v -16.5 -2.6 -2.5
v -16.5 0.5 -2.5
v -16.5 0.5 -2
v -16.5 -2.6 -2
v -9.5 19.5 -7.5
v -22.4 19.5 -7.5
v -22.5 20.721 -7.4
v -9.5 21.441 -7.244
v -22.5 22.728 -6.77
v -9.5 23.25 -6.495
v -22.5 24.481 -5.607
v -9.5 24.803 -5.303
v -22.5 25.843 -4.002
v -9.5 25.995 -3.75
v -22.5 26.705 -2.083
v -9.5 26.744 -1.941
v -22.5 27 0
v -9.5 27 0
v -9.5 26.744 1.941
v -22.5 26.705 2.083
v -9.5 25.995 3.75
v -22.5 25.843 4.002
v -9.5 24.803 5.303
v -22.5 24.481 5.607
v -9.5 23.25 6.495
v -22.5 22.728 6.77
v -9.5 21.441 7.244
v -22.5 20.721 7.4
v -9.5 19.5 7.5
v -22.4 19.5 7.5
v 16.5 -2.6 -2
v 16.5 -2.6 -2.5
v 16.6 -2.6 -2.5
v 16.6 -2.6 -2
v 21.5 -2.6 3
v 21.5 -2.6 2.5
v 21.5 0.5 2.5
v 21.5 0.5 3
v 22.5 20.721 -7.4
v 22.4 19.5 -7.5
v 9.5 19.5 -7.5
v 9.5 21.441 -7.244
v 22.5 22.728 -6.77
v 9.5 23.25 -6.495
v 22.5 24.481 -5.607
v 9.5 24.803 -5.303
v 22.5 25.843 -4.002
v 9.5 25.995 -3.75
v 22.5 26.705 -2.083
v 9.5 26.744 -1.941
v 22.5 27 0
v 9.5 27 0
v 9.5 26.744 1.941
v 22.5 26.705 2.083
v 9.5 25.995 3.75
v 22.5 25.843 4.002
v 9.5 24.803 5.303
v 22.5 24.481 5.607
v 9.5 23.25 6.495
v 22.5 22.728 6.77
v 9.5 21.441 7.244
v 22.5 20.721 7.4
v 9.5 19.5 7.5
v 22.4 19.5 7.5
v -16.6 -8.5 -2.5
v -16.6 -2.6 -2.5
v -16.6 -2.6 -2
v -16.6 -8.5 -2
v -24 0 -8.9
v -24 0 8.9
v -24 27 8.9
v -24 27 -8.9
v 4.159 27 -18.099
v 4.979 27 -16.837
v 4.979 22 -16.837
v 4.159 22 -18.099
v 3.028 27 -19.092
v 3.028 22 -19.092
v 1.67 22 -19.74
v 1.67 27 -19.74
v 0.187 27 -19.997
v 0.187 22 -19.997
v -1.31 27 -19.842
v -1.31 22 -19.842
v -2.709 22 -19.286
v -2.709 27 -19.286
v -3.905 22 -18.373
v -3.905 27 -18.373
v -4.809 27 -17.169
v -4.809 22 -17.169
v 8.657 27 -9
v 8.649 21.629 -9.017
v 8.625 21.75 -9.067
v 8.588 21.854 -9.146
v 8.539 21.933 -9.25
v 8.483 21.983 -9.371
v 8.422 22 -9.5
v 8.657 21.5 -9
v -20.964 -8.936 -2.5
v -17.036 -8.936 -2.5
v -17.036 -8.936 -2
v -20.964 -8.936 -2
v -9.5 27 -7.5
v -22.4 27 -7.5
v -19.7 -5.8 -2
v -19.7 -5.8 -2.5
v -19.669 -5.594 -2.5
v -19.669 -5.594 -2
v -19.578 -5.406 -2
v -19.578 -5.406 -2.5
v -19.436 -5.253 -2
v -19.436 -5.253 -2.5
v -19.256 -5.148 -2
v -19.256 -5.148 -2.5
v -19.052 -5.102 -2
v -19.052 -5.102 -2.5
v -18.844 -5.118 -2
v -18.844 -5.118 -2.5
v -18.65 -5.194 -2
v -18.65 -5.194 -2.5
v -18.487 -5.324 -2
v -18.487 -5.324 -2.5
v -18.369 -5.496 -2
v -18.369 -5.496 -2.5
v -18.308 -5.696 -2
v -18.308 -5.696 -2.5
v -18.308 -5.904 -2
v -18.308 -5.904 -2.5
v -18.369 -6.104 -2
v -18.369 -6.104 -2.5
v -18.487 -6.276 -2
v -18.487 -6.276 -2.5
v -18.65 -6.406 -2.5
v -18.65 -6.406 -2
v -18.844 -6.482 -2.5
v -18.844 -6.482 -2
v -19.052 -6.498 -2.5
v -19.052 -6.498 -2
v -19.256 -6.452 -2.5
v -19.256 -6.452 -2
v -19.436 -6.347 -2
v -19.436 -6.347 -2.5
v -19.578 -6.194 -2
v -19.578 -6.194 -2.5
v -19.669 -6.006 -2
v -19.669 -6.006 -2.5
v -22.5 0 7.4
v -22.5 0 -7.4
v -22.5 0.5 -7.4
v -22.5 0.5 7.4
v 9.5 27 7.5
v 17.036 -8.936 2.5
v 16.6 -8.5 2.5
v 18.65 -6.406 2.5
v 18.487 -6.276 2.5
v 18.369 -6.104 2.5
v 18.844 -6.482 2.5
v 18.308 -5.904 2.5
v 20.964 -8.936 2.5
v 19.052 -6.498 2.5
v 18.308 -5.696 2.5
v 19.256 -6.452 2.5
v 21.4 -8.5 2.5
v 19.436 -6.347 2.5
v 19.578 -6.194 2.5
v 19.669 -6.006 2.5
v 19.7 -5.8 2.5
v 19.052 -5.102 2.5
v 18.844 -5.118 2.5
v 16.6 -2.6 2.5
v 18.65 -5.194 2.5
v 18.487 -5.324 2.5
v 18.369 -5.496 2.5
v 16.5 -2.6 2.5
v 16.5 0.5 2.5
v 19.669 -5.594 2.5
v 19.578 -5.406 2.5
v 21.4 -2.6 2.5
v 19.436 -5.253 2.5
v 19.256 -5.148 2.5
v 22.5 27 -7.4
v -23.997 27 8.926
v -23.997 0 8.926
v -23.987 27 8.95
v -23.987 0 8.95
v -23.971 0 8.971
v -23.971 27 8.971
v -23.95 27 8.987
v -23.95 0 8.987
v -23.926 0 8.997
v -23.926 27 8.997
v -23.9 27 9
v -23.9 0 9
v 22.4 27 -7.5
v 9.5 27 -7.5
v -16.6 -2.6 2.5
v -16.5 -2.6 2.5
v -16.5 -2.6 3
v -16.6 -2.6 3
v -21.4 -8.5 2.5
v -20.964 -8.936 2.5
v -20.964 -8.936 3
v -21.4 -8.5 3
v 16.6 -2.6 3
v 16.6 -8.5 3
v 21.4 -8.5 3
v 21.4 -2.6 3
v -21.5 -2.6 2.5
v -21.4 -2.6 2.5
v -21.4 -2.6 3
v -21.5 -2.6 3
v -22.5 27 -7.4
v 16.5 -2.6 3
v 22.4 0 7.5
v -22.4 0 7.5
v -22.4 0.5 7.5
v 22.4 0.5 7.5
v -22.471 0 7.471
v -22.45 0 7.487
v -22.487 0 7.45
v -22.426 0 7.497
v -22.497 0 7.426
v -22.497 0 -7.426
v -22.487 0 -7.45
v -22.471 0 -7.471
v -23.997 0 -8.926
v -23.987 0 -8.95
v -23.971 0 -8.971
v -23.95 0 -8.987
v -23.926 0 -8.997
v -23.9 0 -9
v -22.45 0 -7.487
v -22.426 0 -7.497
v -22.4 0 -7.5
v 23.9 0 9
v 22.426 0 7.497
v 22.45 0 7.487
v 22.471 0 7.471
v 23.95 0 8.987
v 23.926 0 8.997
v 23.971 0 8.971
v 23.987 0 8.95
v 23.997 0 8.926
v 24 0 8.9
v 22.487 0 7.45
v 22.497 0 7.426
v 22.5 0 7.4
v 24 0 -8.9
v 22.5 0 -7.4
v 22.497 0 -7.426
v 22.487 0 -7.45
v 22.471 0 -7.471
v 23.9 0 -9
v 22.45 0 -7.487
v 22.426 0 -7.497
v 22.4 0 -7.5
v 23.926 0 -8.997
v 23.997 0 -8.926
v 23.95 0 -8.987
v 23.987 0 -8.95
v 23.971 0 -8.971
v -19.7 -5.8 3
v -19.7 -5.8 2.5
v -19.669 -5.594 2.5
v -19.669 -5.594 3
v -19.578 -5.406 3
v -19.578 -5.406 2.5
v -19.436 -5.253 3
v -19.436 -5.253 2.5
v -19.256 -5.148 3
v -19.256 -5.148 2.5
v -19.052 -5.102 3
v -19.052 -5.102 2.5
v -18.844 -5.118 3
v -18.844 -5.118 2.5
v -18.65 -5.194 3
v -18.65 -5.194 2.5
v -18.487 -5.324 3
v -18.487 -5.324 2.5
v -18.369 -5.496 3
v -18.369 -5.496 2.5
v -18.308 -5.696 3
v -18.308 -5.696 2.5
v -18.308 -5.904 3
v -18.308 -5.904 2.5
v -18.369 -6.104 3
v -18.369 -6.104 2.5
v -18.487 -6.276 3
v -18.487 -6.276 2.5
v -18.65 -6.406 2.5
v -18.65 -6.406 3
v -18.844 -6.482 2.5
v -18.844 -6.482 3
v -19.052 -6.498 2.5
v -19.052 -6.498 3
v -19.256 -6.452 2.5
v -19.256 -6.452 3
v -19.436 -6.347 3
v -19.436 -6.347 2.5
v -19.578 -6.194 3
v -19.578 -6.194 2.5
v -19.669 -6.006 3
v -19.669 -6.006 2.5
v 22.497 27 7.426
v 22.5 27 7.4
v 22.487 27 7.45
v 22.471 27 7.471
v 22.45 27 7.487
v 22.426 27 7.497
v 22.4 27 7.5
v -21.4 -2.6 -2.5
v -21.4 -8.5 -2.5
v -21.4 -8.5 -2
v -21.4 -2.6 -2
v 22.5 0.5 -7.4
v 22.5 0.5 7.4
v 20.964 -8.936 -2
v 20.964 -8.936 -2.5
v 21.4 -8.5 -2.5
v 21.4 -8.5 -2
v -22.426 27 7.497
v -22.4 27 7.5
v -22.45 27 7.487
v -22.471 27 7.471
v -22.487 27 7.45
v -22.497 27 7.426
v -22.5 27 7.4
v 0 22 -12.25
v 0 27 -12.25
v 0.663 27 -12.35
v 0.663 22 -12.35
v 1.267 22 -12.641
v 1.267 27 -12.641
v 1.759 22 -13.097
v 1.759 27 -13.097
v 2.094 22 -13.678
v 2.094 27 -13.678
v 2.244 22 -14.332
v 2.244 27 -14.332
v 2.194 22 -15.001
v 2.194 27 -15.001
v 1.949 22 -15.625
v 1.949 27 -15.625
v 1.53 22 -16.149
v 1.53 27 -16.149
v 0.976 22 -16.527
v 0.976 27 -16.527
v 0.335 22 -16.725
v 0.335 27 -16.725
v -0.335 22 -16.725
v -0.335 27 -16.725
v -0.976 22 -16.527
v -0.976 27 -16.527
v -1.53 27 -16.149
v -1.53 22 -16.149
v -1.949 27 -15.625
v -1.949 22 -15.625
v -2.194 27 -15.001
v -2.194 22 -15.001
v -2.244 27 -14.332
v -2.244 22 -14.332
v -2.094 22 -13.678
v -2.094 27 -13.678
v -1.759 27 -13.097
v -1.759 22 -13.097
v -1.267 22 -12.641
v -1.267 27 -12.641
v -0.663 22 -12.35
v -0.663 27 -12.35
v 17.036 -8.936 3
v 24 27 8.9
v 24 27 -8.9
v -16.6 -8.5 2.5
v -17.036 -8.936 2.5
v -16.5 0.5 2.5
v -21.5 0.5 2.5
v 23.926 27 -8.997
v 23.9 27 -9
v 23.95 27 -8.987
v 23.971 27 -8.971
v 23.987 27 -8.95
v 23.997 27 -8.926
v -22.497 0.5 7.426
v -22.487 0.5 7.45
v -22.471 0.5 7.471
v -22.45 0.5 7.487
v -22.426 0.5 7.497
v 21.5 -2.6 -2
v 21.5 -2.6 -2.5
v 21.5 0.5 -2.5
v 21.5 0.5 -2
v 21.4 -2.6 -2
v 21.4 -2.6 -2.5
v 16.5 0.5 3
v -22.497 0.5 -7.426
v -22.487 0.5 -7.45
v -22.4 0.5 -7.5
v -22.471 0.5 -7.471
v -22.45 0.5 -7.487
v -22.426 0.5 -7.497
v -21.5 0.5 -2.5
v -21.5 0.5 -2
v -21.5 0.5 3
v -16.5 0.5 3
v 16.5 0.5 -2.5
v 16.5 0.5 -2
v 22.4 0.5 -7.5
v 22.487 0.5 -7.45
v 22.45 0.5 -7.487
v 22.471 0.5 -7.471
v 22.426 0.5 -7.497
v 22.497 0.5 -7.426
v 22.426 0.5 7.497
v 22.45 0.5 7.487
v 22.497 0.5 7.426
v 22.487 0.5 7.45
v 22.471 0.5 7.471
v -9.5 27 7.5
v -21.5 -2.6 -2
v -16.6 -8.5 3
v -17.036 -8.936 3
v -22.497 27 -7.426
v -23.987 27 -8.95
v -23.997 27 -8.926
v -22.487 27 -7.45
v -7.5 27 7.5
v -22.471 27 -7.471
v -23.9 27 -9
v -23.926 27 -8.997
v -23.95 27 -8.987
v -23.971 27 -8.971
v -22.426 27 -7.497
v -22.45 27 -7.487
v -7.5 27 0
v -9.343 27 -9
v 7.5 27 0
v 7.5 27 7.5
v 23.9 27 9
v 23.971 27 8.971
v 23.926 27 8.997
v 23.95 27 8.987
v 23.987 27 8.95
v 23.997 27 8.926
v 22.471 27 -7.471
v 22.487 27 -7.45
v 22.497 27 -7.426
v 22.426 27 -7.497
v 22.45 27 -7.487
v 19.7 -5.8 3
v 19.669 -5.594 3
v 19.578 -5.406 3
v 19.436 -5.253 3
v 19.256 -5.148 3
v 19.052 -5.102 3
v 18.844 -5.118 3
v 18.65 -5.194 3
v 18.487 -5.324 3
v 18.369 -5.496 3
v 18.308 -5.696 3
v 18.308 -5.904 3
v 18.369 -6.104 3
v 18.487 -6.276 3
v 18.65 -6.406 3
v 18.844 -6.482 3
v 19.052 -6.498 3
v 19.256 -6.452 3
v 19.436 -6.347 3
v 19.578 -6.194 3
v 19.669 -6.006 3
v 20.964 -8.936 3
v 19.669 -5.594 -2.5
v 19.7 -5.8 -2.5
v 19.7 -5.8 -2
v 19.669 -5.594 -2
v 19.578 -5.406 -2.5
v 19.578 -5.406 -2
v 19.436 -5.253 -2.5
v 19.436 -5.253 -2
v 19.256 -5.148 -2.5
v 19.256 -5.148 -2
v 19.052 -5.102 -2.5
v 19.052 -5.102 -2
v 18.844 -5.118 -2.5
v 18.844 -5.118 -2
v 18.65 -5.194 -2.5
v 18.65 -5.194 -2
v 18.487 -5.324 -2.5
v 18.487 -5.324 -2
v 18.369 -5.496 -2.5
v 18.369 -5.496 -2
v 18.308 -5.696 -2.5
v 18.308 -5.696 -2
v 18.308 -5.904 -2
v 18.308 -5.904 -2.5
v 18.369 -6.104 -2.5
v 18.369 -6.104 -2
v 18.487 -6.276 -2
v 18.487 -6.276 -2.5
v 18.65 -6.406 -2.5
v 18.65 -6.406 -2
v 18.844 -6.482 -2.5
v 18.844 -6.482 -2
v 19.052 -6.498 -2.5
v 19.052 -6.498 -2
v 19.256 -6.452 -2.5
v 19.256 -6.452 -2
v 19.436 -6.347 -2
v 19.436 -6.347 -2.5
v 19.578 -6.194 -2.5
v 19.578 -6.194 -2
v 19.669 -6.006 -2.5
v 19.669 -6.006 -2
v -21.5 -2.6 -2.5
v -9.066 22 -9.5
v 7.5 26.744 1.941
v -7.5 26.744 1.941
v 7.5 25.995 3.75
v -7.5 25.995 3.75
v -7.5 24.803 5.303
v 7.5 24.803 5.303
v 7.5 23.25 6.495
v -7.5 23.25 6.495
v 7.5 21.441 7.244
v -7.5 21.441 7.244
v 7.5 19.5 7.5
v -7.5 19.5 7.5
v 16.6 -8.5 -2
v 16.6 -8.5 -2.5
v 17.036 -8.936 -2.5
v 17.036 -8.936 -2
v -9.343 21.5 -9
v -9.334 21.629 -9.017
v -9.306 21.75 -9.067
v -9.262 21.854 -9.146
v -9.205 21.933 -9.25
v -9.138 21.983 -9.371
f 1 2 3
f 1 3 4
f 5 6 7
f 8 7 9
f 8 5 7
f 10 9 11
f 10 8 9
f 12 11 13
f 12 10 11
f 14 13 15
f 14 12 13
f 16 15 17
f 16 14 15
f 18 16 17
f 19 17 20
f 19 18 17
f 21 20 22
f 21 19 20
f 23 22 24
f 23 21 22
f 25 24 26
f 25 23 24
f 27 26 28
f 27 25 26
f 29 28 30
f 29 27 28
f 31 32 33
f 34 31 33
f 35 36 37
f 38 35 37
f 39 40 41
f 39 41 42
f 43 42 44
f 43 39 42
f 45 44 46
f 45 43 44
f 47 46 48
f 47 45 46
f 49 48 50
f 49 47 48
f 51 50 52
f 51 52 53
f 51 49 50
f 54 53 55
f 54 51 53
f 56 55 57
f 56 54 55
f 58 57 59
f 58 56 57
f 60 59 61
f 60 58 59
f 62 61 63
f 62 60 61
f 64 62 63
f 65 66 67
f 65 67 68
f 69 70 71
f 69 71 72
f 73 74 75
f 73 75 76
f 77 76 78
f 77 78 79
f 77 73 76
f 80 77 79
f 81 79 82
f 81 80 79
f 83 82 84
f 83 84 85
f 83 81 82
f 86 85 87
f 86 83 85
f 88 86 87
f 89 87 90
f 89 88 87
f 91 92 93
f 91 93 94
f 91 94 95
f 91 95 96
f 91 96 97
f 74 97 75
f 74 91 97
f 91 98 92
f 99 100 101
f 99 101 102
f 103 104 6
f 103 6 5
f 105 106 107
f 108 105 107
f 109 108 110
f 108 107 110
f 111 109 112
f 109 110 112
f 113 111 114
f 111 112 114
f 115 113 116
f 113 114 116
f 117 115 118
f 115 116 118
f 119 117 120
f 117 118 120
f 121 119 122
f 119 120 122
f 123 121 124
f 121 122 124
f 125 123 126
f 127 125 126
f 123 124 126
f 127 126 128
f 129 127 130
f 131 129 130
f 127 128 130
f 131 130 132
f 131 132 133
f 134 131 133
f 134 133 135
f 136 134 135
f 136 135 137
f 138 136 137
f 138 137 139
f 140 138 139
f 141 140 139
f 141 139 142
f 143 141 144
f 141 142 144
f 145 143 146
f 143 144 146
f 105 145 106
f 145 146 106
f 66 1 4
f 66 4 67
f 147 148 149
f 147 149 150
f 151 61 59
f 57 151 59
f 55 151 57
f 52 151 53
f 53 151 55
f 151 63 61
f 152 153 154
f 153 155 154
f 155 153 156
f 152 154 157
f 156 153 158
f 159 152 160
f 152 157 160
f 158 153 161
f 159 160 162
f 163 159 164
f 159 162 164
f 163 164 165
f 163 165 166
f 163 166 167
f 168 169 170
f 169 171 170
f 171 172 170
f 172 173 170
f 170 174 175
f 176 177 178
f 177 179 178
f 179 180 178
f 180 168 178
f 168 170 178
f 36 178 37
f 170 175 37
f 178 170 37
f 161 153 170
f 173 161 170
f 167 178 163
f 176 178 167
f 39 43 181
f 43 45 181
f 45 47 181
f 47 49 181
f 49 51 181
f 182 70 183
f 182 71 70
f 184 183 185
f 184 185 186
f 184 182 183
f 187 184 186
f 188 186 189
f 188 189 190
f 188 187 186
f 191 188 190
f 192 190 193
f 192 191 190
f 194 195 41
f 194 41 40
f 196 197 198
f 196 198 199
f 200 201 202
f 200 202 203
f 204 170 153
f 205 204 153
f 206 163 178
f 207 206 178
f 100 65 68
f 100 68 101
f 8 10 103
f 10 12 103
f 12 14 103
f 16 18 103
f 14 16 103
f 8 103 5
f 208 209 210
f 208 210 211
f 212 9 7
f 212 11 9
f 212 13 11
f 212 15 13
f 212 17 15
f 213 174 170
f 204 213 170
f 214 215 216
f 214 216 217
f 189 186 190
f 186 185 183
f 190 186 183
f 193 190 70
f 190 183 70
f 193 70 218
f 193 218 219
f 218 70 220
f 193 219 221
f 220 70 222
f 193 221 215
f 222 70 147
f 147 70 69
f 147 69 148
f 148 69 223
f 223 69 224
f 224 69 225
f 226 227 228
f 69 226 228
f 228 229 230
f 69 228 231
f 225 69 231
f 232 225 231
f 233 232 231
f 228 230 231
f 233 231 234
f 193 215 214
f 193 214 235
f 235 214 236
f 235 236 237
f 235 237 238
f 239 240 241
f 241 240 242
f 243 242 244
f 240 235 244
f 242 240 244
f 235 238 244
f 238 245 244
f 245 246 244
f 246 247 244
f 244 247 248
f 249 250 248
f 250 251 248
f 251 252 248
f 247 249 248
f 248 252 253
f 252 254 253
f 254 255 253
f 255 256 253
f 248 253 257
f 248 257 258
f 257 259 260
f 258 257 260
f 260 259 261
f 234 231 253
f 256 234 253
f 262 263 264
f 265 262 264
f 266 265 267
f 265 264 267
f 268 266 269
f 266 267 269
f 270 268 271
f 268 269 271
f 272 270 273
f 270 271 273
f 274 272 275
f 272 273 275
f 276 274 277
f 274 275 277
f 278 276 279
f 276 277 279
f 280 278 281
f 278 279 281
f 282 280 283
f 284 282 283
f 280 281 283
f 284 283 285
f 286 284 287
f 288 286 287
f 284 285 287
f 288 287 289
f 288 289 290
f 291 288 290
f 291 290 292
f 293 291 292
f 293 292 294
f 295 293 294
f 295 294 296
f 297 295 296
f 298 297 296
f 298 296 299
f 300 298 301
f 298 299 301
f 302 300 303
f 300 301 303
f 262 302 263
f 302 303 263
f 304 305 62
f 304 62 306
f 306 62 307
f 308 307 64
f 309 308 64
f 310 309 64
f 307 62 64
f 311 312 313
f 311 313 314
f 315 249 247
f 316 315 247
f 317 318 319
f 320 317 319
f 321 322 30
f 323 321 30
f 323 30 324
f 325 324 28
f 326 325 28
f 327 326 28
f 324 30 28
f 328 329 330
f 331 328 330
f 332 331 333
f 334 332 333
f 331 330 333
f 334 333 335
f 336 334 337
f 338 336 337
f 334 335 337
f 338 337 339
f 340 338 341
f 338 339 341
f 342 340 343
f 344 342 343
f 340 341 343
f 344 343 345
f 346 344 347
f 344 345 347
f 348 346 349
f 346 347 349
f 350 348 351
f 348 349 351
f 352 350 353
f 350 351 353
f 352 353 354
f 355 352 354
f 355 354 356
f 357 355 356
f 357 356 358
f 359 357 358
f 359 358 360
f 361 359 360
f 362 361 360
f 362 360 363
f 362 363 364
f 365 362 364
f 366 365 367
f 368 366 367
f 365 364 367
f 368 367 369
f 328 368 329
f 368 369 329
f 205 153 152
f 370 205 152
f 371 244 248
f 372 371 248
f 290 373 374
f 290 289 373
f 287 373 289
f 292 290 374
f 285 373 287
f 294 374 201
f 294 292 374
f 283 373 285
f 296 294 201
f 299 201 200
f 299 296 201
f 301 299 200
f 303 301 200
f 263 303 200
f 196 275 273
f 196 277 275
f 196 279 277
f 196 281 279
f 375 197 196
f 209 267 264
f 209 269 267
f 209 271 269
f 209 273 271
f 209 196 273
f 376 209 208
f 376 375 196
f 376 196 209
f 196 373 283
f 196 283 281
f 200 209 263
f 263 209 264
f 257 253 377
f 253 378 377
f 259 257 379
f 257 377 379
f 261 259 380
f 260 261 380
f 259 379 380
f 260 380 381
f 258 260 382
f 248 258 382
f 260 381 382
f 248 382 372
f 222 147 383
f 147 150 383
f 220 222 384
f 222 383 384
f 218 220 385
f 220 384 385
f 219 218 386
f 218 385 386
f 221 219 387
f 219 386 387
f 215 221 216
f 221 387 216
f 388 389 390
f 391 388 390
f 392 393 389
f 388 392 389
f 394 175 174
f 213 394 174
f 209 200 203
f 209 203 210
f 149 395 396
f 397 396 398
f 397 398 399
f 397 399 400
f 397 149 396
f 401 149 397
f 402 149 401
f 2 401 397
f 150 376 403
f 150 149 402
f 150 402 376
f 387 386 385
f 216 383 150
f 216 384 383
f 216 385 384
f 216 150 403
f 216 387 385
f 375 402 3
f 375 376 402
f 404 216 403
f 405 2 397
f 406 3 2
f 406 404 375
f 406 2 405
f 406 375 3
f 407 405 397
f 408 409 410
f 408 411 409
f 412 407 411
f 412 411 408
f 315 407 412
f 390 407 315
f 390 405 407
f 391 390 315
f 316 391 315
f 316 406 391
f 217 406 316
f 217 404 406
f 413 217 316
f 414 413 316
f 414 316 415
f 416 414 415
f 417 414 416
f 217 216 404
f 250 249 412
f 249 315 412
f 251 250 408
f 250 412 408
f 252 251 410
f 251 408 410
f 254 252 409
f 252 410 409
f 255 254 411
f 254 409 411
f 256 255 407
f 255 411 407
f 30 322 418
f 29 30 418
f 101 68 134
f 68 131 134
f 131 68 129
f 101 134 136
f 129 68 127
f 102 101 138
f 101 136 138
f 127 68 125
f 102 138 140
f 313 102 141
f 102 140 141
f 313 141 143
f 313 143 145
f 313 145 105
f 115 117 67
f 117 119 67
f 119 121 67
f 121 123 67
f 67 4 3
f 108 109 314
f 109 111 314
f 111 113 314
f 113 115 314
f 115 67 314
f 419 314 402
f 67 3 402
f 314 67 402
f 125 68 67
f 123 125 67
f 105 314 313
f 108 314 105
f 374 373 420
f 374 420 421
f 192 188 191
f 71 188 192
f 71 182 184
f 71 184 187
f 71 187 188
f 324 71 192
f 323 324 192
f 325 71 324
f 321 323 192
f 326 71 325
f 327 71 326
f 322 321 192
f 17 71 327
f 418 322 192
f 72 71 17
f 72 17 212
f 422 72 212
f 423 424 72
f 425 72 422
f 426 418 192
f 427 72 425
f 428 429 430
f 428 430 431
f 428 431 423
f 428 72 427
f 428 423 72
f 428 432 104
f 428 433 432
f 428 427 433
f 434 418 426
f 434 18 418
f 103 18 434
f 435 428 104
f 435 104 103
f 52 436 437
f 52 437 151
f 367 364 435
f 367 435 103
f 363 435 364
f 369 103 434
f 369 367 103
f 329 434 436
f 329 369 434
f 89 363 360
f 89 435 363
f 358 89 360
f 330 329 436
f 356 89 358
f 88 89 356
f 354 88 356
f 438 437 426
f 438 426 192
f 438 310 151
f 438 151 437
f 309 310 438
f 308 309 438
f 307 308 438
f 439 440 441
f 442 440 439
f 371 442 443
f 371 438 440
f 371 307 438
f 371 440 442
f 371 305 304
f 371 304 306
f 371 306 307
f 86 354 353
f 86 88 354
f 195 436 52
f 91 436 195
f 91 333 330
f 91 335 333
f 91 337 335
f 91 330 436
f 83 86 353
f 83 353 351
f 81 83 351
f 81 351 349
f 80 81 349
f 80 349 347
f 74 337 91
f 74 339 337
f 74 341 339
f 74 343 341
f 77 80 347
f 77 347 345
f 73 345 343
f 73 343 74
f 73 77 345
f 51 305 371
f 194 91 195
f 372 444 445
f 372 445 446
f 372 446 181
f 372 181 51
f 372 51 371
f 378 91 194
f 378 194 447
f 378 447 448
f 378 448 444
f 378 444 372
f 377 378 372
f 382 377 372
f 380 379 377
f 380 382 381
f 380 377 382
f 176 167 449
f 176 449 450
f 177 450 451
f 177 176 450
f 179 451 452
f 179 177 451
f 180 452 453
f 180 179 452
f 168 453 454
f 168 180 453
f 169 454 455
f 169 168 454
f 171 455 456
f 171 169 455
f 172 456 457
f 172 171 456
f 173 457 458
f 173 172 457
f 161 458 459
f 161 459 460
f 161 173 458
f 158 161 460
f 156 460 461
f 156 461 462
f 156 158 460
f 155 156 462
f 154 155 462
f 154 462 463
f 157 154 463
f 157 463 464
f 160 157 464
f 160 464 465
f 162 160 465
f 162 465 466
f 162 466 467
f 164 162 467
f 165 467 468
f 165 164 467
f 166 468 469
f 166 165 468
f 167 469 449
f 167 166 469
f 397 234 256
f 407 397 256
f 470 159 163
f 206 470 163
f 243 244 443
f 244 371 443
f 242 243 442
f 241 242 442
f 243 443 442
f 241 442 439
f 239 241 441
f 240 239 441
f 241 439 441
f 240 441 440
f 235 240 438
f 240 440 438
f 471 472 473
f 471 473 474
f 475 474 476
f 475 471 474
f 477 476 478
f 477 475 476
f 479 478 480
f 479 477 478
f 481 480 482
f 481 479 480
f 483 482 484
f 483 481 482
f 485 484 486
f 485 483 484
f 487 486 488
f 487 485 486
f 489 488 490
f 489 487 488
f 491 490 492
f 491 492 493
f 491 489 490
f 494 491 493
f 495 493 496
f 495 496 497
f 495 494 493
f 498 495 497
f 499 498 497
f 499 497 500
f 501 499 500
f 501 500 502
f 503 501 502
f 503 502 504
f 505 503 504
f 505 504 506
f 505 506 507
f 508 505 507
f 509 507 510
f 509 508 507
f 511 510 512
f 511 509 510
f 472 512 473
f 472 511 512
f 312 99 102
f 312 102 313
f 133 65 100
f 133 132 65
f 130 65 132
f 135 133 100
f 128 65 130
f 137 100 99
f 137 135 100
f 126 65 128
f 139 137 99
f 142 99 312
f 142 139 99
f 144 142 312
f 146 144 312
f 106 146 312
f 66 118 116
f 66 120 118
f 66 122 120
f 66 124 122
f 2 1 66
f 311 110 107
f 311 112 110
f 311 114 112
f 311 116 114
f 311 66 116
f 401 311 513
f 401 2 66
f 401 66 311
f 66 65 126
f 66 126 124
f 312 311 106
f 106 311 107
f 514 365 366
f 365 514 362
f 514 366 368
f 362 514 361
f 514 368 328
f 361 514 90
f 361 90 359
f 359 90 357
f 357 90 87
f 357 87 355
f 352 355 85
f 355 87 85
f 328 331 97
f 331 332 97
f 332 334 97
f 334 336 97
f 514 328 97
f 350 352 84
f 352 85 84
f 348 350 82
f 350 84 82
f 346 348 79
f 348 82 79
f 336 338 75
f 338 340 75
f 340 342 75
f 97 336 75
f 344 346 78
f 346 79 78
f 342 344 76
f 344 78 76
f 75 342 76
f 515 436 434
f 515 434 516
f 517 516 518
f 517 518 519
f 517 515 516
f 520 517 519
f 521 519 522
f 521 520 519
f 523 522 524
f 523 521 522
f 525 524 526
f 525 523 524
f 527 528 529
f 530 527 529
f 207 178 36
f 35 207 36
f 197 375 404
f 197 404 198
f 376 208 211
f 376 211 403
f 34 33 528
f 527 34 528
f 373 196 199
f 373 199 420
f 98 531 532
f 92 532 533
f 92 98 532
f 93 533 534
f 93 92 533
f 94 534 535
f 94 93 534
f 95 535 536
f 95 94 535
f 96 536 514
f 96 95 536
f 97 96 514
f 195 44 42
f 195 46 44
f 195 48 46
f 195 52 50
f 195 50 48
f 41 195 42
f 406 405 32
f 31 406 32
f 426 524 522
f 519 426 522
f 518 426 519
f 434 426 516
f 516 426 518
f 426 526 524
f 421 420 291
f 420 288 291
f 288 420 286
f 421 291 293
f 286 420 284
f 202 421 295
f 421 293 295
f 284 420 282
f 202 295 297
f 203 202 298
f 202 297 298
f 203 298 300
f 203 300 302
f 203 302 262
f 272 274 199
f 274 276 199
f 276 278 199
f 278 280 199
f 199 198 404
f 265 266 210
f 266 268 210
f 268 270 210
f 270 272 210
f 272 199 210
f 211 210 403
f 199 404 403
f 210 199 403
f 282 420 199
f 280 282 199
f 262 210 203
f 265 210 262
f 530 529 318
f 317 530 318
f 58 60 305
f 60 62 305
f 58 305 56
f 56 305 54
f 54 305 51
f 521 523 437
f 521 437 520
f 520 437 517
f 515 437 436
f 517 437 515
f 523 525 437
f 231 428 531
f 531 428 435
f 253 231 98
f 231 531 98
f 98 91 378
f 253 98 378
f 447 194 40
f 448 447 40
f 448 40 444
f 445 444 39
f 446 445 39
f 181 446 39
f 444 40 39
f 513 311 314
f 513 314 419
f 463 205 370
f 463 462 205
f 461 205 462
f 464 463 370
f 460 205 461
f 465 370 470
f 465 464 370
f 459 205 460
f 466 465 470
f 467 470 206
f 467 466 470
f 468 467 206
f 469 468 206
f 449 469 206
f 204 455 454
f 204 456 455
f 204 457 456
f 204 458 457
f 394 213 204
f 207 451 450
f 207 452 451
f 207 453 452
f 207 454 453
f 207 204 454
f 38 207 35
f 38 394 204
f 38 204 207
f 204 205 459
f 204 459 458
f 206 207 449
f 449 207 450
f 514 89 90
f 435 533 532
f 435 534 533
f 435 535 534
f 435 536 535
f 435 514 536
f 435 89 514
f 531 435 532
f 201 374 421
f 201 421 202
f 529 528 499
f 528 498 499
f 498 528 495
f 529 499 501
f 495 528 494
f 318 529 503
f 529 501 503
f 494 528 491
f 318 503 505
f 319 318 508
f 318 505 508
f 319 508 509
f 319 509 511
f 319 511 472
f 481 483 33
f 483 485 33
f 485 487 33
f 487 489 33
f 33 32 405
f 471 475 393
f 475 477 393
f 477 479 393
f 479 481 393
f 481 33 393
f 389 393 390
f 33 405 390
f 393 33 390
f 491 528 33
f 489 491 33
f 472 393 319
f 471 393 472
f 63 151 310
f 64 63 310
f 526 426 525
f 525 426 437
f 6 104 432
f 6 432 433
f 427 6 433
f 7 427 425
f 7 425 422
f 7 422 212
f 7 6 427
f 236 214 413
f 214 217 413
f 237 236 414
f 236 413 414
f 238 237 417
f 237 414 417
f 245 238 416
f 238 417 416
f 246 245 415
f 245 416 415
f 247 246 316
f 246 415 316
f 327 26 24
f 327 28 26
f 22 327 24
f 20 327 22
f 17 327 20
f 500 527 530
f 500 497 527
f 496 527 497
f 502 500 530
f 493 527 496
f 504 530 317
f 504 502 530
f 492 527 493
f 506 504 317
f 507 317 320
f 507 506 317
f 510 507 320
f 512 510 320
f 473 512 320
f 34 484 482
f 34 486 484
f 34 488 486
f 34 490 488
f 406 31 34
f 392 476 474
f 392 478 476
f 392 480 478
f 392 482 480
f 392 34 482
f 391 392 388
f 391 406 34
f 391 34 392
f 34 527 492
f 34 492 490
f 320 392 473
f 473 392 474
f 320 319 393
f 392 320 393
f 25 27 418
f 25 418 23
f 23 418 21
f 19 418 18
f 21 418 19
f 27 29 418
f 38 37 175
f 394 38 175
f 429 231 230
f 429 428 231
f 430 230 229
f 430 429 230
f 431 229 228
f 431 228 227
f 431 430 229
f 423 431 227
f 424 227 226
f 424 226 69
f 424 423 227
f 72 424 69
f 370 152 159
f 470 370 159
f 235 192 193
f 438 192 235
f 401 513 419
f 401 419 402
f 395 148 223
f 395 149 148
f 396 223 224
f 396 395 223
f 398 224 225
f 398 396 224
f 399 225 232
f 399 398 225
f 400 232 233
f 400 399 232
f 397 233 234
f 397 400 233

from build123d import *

# Parameters (mm, degrees)
SKETCH1_W            = 48
SKETCH1_H            = 18
BOSS_EXTRUDE1_DEPTH  = 27
SKETCH7_W            = 45
SKETCH7_H            = 15
CUT_EXTRUDE8_DEPTH   = 38.229020938
BOSS_EXTRUDE4_REACH  = 56.518
SKETCH10_W           = 2
SKETCH10_H           = 18
BOSS_EXTRUDE5_DEPTH  = 27
SKETCH11_R           = 2.25
BOSS_EXTRUDE7_DEPTH  = 5
FILLET1_R            = 0.5
SKETCH12_W           = 45
SKETCH12_H           = 15
CUT_EXTRUDE9_DEPTH   = 0.5
BOSS_EXTRUDE8_START  = 2.5
SKETCH15_R           = 0.7
BOSS_EXTRUDE8_DEPTH  = 0.5
BOSS_EXTRUDE9_START  = -2.5
SKETCH15_2_R         = 0.7
BOSS_EXTRUDE9_DEPTH  = 0.5
FILLET2_R            = 0.1
BOSS_EXTRUDE10_REACH = 41.715
SKETCH16_W           = 15
SKETCH16_H           = 7.5
FILLET3_R            = 0.1


with BuildPart() as part:
    # Sketch1 → Boss-Extrude1 (new body)
    with BuildSketch(Plane(origin=(0, 0, 0), x_dir=(1, 0, 0), z_dir=(0, 1, 0))):
        Rectangle(SKETCH1_W, SKETCH1_H)
    extrude(amount=BOSS_EXTRUDE1_DEPTH)

    # Sketch7 → Cut-Extrude8 (cut, through all)
    with BuildSketch(Plane(origin=(0, 27, 0), x_dir=(1, 0, 0), z_dir=(0, 1, 0))):
        Rectangle(SKETCH7_W, SKETCH7_H)
    extrude(amount=-CUT_EXTRUDE8_DEPTH, mode=Mode.SUBTRACT)


with BuildPart() as body_2:

    # Sketch9 → Boss-Extrude4 (new, up to next)
    with BuildSketch(Plane.ZY.offset(-22.5), mode=Mode.PRIVATE) as boss_extrude4_sk1:
        with BuildLine():
            Line((-7.5, 0), (-7.5, 19.5))
            ThreePointArc((-7.5, 19.5), (0, 27), (7.5, 19.5))
            Line((7.5, 19.5), (7.5, 0))
            Line((7.5, 0), (-7.5, 0))
        make_face()
    boss_extrude4_tool1 = extrude(boss_extrude4_sk1.sketch, amount=BOSS_EXTRUDE4_REACH, mode=Mode.PRIVATE) - part.part
    add(boss_extrude4_tool1.solids().sort_by_distance((22.5, 12.750425, 0))[0])


with BuildPart() as part_1:
    add(part.part)

    add(body_2.part)  # Boss-Extrude5 merges body 2
    # Sketch10 → Boss-Extrude5 (add)
    with BuildSketch(Plane(origin=(0, 27, 0), x_dir=(1, 0, 0), z_dir=(0, 1, 0))):
        with Locations((-8.5, 0)):
            Rectangle(SKETCH10_W, SKETCH10_H)
        with Locations((8.5, 0)):
            Rectangle(SKETCH10_W, SKETCH10_H)
    extrude(amount=-BOSS_EXTRUDE5_DEPTH)

    # Sketch11 → Boss-Extrude7 (add)
    with BuildSketch(Plane(origin=(0, 27, 0), x_dir=(1, 0, 0), z_dir=(0, 1, 0))):
        with BuildLine():
            Line((-9.34326642, 9), (8.65673358, 9))
            Line((8.65673358, 9), (4.978963589, 16.836647508))
            ThreePointArc((4.978963589, 16.836647508), (0.186765378, 19.996828057), (-4.808879939, 17.169208446))
            Line((-4.808879939, 17.169208446), (-9.34326642, 9))
        make_face()
        with Locations(Location((0, 14.5, 0), (0, 0, 270))):
            Circle(SKETCH11_R, mode=Mode.SUBTRACT)
    extrude(amount=-BOSS_EXTRUDE7_DEPTH)

    # Fillet1
    fillet1_edges = [part_1.edges().sort_by_distance(p)[0] for p in [
        (-0.34326642, 22, -9),
    ]]
    fillet(fillet1_edges, radius=FILLET1_R)

    # Sketch12 → Cut-Extrude9 (cut)
    with BuildSketch(Plane.XZ):
        Rectangle(SKETCH12_W, SKETCH12_H)
    extrude(amount=-CUT_EXTRUDE9_DEPTH, mode=Mode.SUBTRACT)

    # Sketch15<2> → Boss-Extrude9 (add)
    with BuildSketch(Plane.XY.offset(BOSS_EXTRUDE9_START)):
        Polygon((21.5, 0.5), (16.5, 0.5), (16.5, -2.6), (16.6, -2.6), (16.6, -8.5), (17.035978299, -8.935978299), (20.964021701, -8.935978299), (21.4, -8.5), (21.4, -2.6), (21.5, -2.6), align=None)
        with Locations((19, -5.8)):
            Circle(SKETCH15_2_R, mode=Mode.SUBTRACT)
    boss_extrude9 = extrude(amount=BOSS_EXTRUDE9_DEPTH)


with BuildPart() as body_2_2:
    # Sketch15 → Boss-Extrude8 (new body)
    with BuildSketch(Plane.XY.offset(BOSS_EXTRUDE8_START)):
        Polygon((21.5, 0.5), (16.5, 0.5), (16.5, -2.6), (16.6, -2.6), (16.6, -8.5), (17.035978299, -8.935978299), (20.964021701, -8.935978299), (21.4, -8.5), (21.4, -2.6), (21.5, -2.6), align=None)
        with Locations((19, -5.8)):
            Circle(SKETCH15_R, mode=Mode.SUBTRACT)
    boss_extrude8 = extrude(amount=BOSS_EXTRUDE8_DEPTH)


with BuildPart() as part_2:
    add(part_1.part)

    # Mirror1: Boss-Extrude8, Boss-Extrude9 across plane
    add(boss_extrude8.mirror(Plane(origin=(0, 0, 0), x_dir=(0, 0, 1), z_dir=(1, 0, 0))))
    add(boss_extrude9.mirror(Plane(origin=(0, 0, 0), x_dir=(0, 0, 1), z_dir=(1, 0, 0))))

    # Fillet2
    fillet2_edges = [part_2.edges().sort_by_distance(p)[0] for p in [
        (22.5, 23.25, -7.5),
        (22.5, 23.25, 7.5),
        (-22.5, 23.25, -7.5),
        (-22.5, 23.25, 7.5),
        (24, 13.5, 9),
        (-24, 13.5, 9),
        (-24, 13.5, -9),
        (24, 13.5, -9),
    ]]
    fillet(fillet2_edges, radius=FILLET2_R)

    # Sketch16 → Boss-Extrude10 (add, up to next)
    with BuildSketch(Plane.XY.offset(-7.5), mode=Mode.PRIVATE) as boss_extrude10_sk1:
        with Locations((0, 23.25)):
            Rectangle(SKETCH16_W, SKETCH16_H)
    boss_extrude10_tool1 = extrude(boss_extrude10_sk1.sketch, amount=BOSS_EXTRUDE10_REACH, mode=Mode.PRIVATE) - part_2.part
    add(boss_extrude10_tool1.solids().sort_by_distance((0, 23.25, -7.5))[0])

    # Fillet3
    fillet3_edges = [part_2.edges().sort_by_distance(p)[0] for p in [
        (22.5, 0.25, -7.5),
        (-22.5, 0.25, -7.5),
        (-22.5, 0.25, 7.5),
        (22.5, 0.25, 7.5),
    ]]
    fillet(fillet3_edges, radius=FILLET3_R)


solid = Compound([body_2_2.part, part_2.part])
